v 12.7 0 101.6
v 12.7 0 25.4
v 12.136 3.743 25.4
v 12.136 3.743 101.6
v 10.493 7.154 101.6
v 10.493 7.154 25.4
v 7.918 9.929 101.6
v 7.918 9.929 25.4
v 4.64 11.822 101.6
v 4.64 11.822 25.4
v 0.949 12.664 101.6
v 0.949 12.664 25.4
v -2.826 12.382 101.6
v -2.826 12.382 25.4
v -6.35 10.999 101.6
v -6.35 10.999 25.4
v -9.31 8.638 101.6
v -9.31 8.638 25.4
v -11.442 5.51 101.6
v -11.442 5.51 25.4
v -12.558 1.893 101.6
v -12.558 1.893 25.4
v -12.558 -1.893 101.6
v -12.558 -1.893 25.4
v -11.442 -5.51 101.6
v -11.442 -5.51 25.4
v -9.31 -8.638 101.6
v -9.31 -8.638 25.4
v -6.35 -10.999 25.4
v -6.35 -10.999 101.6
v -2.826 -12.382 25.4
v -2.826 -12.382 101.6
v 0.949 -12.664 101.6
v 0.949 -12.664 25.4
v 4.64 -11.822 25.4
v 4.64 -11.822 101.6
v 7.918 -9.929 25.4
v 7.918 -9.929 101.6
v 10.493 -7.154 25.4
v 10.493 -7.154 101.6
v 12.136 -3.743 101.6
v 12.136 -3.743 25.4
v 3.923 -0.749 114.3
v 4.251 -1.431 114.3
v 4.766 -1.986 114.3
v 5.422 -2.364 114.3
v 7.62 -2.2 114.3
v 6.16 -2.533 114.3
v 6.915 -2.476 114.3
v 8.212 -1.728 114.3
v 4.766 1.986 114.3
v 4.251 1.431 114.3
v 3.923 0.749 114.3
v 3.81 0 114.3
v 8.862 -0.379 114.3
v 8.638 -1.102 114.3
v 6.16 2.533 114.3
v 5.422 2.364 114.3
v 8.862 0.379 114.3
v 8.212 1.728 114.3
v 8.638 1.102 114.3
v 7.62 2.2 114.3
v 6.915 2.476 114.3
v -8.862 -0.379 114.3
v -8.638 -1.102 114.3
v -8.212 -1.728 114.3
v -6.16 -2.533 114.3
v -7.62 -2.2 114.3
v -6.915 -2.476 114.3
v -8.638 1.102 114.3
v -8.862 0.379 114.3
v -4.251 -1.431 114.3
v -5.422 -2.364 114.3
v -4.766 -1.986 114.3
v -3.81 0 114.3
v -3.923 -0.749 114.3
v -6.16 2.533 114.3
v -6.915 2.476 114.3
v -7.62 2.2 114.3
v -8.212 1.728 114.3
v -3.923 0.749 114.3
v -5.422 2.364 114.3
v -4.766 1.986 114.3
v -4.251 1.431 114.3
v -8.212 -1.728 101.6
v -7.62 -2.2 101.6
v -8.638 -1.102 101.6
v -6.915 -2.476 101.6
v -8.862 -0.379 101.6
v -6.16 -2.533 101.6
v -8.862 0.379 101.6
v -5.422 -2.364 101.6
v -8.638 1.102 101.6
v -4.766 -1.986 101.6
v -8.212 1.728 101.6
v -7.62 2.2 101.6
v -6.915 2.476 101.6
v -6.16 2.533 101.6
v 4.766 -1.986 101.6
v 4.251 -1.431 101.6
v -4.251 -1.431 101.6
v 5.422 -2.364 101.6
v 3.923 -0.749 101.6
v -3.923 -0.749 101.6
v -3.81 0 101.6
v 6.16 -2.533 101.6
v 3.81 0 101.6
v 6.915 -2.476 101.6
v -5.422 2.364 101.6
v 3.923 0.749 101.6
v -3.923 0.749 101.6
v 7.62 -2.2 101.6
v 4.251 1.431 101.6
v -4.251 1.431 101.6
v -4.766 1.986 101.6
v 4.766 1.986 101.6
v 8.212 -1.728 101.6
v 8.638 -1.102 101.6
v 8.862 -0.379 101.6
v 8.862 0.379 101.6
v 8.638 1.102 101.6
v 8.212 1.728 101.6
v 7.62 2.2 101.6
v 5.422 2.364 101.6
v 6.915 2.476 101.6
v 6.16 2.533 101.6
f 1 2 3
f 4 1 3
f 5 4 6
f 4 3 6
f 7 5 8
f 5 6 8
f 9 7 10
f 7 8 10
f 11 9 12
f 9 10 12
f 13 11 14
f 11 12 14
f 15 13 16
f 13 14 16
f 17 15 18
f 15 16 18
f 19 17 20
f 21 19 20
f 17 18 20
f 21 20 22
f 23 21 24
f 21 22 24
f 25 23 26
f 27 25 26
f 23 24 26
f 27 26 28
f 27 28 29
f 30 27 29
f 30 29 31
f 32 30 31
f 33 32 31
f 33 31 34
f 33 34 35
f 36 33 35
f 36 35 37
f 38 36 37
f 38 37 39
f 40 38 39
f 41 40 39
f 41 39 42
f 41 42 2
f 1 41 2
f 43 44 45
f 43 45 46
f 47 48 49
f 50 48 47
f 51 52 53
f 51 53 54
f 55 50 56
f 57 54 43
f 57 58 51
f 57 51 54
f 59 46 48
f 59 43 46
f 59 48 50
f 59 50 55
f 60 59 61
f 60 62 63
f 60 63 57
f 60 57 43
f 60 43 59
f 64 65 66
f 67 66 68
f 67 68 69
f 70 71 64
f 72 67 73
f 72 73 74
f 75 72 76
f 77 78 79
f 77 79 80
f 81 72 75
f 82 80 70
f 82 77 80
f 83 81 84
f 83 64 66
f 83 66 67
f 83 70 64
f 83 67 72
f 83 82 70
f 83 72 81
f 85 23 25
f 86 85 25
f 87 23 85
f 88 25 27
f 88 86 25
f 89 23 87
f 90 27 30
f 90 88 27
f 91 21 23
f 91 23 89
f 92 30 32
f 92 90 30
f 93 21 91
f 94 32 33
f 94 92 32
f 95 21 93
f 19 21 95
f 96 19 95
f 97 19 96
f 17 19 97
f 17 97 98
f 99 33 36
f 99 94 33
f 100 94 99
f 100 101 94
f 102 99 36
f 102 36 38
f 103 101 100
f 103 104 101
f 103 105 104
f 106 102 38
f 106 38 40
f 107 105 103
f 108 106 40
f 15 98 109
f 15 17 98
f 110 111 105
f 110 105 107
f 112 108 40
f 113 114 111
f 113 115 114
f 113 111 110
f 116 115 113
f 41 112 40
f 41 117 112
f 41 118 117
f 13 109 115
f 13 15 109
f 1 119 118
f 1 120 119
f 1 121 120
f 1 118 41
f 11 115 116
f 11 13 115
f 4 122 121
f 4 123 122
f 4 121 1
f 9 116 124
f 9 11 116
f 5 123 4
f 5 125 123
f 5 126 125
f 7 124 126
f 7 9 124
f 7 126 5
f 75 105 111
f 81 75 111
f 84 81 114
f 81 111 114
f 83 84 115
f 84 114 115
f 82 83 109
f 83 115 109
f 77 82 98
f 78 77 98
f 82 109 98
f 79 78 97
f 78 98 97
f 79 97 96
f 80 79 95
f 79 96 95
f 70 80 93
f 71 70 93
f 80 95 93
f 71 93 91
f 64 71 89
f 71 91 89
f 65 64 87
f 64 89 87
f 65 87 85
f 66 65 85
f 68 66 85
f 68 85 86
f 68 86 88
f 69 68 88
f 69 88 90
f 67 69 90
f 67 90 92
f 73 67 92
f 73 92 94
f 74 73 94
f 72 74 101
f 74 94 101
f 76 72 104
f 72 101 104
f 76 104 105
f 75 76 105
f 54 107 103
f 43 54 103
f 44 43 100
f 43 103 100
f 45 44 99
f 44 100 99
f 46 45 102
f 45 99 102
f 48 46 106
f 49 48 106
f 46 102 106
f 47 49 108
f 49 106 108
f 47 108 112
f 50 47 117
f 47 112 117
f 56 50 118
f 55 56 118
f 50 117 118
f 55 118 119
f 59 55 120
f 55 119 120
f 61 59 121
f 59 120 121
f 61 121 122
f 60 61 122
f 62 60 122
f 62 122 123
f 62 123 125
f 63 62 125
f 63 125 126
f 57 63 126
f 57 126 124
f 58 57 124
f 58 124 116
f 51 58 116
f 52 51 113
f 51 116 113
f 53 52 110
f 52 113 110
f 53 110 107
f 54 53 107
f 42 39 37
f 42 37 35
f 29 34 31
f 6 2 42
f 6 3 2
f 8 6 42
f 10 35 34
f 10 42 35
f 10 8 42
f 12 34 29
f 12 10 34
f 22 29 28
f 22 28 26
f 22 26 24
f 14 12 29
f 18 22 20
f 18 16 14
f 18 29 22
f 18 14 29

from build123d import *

# Parameters (mm, degrees)
SKETCH2_R           = 12.7
BOSS_EXTRUDE1_DEPTH = 101.6
BOSS_EXTRUDE2_DEPTH = 12.7
SKETCH4_R           = 14.196290171
CUT_EXTRUDE1_DEPTH  = 25.4


with BuildPart() as part:
    # Sketch2 → Boss-Extrude1 (new body)
    with BuildSketch(Plane.XY):
        Circle(SKETCH2_R)
    extrude(amount=BOSS_EXTRUDE1_DEPTH)

    # Sketch3 → Boss-Extrude2 (add)
    with BuildSketch(Plane.XY.offset(101.6)):
        with BuildLine():
            ThreePointArc((-8.89, 0), (-6.35, -2.54), (-3.81, 0))
            Line((-3.81, 0), (-8.89, 0))
        make_face()
        with BuildLine():
            Line((-8.89, 0), (-3.81, 0))
            ThreePointArc((-3.81, 0), (-6.35, 2.54), (-8.89, 0))
        make_face()
        with BuildLine():
            ThreePointArc((8.89, 0), (6.35, 2.54), (3.81, 0))
            Line((3.81, 0), (8.89, 0))
        make_face()
        with BuildLine():
            Line((8.89, 0), (3.81, 0))
            ThreePointArc((3.81, 0), (6.35, -2.54), (8.89, 0))
        make_face()
    extrude(amount=BOSS_EXTRUDE2_DEPTH)

    # Sketch4 → Cut-Extrude1 (cut)
    with BuildSketch(Plane(origin=(0, 0, 0), x_dir=(-1, 0, 0), z_dir=(0, 0, -1))):
        Circle(SKETCH4_R)
    extrude(amount=-CUT_EXTRUDE1_DEPTH, mode=Mode.SUBTRACT)


solid = part.part
